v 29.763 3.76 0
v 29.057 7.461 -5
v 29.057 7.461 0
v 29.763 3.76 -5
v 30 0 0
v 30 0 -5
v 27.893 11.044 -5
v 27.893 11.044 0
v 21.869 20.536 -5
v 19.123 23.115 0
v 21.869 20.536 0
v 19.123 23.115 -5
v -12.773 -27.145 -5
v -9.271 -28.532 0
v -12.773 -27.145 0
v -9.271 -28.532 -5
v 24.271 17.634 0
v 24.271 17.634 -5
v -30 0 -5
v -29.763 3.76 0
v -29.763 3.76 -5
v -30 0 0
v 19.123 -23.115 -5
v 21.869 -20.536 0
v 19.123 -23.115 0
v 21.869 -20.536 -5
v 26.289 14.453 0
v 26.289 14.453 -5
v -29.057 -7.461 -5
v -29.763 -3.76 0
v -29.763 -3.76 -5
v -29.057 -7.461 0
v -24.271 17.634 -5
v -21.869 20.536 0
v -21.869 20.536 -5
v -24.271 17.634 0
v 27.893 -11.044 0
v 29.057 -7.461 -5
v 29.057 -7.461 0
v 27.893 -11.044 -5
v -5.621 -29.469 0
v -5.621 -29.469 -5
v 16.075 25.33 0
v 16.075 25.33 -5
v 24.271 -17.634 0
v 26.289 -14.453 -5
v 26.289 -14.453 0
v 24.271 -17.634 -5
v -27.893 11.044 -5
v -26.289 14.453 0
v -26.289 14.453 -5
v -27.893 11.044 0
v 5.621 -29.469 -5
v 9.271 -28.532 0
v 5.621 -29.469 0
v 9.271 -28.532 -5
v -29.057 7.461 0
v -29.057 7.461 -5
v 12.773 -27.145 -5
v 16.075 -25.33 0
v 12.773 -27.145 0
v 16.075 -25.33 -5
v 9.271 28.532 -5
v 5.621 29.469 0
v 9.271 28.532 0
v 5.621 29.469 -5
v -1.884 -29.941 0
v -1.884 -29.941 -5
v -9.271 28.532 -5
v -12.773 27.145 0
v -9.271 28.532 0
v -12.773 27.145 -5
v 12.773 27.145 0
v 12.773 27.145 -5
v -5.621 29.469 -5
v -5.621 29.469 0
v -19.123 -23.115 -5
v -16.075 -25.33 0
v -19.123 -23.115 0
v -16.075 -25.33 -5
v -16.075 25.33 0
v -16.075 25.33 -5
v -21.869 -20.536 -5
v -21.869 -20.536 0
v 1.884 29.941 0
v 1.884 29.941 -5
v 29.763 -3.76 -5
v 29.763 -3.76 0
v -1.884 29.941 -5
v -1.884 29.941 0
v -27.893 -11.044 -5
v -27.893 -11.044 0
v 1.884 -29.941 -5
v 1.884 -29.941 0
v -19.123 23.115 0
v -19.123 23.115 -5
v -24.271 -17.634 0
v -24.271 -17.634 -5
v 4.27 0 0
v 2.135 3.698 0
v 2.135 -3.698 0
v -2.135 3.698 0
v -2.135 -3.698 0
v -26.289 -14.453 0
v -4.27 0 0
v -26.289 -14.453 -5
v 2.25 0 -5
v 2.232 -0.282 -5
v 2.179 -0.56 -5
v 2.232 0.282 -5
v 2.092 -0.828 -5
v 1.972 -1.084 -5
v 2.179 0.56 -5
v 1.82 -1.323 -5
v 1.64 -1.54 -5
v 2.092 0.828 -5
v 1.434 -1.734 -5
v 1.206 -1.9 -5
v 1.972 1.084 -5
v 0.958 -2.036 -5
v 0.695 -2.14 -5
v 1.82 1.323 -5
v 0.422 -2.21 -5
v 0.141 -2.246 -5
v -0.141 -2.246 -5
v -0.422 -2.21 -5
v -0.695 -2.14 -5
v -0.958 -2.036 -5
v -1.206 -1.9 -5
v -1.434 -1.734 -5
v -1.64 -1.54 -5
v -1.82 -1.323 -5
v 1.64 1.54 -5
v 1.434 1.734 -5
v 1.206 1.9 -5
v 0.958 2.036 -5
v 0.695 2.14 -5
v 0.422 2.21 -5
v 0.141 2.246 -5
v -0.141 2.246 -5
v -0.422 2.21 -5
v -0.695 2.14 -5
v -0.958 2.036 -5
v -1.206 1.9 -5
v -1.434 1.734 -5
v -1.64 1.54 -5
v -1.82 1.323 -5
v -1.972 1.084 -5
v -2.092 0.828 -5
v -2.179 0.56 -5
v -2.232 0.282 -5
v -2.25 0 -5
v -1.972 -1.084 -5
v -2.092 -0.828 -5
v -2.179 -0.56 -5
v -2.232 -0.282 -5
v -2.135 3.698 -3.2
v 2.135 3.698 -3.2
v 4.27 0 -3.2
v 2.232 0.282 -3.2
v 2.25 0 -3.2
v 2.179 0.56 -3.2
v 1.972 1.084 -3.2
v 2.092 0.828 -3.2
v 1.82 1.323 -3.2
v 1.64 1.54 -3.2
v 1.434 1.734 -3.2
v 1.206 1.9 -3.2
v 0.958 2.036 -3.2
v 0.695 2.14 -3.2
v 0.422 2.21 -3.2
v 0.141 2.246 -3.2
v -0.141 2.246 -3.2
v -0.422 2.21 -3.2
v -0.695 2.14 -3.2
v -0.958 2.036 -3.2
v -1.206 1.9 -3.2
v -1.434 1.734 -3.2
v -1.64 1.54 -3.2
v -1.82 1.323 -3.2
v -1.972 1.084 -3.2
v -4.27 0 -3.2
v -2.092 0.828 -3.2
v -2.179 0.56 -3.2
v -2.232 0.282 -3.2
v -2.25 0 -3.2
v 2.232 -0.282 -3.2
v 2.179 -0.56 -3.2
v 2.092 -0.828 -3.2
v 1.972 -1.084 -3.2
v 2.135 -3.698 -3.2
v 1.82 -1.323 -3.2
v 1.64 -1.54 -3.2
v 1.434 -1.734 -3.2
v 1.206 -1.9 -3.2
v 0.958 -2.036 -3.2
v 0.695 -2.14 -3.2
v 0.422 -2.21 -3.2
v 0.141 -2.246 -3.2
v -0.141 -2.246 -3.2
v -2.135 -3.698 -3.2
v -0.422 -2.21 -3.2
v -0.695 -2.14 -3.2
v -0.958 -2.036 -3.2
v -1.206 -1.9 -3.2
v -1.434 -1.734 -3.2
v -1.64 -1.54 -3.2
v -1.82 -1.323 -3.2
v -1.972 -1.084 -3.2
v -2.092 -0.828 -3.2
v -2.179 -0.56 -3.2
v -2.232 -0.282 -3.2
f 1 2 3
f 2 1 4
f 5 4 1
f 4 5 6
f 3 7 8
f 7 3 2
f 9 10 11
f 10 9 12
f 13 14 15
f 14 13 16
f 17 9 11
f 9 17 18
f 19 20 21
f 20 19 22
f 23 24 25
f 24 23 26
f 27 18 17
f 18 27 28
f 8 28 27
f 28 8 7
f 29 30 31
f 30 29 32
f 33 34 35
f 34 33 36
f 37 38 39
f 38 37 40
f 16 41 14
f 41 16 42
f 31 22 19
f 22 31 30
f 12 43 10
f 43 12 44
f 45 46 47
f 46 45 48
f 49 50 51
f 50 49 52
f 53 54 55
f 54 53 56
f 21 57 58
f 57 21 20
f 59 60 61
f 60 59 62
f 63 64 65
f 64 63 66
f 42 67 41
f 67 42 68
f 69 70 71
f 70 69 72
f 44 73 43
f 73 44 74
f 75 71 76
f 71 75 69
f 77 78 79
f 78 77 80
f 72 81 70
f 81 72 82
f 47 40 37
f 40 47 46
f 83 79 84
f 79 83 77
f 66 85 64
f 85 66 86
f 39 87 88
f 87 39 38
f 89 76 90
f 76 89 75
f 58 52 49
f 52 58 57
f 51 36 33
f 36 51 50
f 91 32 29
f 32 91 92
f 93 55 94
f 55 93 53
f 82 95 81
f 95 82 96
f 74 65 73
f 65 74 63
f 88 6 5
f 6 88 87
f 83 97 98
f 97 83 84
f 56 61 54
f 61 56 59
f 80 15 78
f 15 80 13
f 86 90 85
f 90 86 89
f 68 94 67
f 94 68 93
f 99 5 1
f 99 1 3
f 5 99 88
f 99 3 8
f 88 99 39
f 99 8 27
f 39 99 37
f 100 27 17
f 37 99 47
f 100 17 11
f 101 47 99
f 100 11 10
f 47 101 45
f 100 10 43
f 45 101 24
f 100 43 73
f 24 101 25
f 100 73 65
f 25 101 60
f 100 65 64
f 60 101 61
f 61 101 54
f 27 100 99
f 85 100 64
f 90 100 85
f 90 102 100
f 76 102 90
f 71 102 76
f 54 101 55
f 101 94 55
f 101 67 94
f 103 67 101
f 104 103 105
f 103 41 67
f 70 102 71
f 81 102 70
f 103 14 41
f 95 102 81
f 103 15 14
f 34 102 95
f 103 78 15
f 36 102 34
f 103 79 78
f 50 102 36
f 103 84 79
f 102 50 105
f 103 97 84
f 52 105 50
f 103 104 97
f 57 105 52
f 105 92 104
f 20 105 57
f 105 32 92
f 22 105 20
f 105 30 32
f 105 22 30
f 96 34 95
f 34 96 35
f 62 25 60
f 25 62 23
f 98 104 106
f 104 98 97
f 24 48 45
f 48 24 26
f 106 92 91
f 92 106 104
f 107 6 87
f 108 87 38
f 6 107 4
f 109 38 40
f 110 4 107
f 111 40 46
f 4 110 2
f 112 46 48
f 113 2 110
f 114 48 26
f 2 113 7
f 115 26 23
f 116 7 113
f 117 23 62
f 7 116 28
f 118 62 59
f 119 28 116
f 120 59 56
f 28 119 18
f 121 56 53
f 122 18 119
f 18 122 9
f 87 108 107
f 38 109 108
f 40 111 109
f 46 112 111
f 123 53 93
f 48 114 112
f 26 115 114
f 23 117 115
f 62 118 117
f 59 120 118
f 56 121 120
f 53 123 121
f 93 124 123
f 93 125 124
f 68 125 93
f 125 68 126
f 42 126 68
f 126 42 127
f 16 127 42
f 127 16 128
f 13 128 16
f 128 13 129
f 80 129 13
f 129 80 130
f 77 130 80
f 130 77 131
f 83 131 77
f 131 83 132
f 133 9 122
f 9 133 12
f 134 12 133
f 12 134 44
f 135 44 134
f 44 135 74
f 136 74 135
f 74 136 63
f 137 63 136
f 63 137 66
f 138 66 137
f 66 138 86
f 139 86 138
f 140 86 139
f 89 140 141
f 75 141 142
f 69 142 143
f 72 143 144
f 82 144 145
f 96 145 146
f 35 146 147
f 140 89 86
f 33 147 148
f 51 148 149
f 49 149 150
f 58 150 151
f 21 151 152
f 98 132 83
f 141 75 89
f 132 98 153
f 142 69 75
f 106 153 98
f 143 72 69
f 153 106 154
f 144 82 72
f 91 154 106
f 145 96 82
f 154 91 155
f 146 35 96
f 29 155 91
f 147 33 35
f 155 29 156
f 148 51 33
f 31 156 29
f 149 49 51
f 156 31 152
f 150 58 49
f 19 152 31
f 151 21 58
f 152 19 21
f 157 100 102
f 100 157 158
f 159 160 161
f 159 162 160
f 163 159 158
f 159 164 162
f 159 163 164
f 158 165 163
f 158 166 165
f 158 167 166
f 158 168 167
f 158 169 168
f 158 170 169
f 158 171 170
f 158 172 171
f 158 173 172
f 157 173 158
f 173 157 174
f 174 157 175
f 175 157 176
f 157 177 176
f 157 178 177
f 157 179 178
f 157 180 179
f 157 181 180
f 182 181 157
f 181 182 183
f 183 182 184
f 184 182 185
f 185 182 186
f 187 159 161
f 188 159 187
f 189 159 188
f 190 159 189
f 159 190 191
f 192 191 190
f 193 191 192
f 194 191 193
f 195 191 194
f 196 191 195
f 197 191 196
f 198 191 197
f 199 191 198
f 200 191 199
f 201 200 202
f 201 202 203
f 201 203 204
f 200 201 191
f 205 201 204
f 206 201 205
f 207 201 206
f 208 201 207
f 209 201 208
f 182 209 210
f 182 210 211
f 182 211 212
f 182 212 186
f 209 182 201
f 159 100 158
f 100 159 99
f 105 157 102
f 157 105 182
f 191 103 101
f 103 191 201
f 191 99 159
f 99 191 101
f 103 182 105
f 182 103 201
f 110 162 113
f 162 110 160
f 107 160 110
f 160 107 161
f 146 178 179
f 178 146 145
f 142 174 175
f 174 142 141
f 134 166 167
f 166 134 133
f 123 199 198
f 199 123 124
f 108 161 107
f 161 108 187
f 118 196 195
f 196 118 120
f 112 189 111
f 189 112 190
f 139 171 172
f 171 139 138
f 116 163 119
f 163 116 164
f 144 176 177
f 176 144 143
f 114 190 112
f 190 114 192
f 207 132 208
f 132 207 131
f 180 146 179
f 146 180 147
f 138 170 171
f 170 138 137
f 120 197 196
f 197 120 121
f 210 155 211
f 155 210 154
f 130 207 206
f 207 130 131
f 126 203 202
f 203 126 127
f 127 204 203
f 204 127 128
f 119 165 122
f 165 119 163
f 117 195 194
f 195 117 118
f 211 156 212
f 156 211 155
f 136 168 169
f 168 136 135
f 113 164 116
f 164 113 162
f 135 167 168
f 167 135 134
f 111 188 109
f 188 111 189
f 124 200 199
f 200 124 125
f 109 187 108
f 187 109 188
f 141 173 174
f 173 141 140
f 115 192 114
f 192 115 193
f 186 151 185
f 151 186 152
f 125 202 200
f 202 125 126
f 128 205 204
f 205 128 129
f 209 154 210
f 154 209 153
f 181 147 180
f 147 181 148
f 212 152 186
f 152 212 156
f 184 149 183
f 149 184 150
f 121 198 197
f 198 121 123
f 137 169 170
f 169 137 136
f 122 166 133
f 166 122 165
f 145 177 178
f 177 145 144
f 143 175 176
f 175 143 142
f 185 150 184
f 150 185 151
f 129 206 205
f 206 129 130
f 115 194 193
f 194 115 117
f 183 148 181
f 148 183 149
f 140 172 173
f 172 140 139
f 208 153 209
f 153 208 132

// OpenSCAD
$fn = 50;


difference() {
	union() {
		translate(v = [0, 0, -5.0000000000]) {
			cylinder(h = 5.0000000000, r = 30.0000000000);
		}
		translate(v = [0, 0, -3.5000000000]) {
			cylinder(h = 3.5000000000, r = 2.8750000000);
		}
	}
	union() {
		translate(v = [0, 0, 0]) {
			rotate(a = [0, 0, 0]) {
				difference() {
					union() {
						translate(v = [0, 0, -3.2000000000]) {
							linear_extrude(height = 3.2000000000) {
								polygon(points = [[4.2698000000, 0.0000000000], [2.1349000000, 3.6977552691], [-2.1349000000, 3.6977552691], [-4.2698000000, 0.0000000000], [-2.1349000000, -3.6977552691], [2.1349000000, -3.6977552691]]);
							}
						}
					}
					union();
				}
			}
		}
		#translate(v = [0, 0, -100.0000000000]) {
			cylinder(h = 200, r = 2.2500000000);
		}
	}
}
